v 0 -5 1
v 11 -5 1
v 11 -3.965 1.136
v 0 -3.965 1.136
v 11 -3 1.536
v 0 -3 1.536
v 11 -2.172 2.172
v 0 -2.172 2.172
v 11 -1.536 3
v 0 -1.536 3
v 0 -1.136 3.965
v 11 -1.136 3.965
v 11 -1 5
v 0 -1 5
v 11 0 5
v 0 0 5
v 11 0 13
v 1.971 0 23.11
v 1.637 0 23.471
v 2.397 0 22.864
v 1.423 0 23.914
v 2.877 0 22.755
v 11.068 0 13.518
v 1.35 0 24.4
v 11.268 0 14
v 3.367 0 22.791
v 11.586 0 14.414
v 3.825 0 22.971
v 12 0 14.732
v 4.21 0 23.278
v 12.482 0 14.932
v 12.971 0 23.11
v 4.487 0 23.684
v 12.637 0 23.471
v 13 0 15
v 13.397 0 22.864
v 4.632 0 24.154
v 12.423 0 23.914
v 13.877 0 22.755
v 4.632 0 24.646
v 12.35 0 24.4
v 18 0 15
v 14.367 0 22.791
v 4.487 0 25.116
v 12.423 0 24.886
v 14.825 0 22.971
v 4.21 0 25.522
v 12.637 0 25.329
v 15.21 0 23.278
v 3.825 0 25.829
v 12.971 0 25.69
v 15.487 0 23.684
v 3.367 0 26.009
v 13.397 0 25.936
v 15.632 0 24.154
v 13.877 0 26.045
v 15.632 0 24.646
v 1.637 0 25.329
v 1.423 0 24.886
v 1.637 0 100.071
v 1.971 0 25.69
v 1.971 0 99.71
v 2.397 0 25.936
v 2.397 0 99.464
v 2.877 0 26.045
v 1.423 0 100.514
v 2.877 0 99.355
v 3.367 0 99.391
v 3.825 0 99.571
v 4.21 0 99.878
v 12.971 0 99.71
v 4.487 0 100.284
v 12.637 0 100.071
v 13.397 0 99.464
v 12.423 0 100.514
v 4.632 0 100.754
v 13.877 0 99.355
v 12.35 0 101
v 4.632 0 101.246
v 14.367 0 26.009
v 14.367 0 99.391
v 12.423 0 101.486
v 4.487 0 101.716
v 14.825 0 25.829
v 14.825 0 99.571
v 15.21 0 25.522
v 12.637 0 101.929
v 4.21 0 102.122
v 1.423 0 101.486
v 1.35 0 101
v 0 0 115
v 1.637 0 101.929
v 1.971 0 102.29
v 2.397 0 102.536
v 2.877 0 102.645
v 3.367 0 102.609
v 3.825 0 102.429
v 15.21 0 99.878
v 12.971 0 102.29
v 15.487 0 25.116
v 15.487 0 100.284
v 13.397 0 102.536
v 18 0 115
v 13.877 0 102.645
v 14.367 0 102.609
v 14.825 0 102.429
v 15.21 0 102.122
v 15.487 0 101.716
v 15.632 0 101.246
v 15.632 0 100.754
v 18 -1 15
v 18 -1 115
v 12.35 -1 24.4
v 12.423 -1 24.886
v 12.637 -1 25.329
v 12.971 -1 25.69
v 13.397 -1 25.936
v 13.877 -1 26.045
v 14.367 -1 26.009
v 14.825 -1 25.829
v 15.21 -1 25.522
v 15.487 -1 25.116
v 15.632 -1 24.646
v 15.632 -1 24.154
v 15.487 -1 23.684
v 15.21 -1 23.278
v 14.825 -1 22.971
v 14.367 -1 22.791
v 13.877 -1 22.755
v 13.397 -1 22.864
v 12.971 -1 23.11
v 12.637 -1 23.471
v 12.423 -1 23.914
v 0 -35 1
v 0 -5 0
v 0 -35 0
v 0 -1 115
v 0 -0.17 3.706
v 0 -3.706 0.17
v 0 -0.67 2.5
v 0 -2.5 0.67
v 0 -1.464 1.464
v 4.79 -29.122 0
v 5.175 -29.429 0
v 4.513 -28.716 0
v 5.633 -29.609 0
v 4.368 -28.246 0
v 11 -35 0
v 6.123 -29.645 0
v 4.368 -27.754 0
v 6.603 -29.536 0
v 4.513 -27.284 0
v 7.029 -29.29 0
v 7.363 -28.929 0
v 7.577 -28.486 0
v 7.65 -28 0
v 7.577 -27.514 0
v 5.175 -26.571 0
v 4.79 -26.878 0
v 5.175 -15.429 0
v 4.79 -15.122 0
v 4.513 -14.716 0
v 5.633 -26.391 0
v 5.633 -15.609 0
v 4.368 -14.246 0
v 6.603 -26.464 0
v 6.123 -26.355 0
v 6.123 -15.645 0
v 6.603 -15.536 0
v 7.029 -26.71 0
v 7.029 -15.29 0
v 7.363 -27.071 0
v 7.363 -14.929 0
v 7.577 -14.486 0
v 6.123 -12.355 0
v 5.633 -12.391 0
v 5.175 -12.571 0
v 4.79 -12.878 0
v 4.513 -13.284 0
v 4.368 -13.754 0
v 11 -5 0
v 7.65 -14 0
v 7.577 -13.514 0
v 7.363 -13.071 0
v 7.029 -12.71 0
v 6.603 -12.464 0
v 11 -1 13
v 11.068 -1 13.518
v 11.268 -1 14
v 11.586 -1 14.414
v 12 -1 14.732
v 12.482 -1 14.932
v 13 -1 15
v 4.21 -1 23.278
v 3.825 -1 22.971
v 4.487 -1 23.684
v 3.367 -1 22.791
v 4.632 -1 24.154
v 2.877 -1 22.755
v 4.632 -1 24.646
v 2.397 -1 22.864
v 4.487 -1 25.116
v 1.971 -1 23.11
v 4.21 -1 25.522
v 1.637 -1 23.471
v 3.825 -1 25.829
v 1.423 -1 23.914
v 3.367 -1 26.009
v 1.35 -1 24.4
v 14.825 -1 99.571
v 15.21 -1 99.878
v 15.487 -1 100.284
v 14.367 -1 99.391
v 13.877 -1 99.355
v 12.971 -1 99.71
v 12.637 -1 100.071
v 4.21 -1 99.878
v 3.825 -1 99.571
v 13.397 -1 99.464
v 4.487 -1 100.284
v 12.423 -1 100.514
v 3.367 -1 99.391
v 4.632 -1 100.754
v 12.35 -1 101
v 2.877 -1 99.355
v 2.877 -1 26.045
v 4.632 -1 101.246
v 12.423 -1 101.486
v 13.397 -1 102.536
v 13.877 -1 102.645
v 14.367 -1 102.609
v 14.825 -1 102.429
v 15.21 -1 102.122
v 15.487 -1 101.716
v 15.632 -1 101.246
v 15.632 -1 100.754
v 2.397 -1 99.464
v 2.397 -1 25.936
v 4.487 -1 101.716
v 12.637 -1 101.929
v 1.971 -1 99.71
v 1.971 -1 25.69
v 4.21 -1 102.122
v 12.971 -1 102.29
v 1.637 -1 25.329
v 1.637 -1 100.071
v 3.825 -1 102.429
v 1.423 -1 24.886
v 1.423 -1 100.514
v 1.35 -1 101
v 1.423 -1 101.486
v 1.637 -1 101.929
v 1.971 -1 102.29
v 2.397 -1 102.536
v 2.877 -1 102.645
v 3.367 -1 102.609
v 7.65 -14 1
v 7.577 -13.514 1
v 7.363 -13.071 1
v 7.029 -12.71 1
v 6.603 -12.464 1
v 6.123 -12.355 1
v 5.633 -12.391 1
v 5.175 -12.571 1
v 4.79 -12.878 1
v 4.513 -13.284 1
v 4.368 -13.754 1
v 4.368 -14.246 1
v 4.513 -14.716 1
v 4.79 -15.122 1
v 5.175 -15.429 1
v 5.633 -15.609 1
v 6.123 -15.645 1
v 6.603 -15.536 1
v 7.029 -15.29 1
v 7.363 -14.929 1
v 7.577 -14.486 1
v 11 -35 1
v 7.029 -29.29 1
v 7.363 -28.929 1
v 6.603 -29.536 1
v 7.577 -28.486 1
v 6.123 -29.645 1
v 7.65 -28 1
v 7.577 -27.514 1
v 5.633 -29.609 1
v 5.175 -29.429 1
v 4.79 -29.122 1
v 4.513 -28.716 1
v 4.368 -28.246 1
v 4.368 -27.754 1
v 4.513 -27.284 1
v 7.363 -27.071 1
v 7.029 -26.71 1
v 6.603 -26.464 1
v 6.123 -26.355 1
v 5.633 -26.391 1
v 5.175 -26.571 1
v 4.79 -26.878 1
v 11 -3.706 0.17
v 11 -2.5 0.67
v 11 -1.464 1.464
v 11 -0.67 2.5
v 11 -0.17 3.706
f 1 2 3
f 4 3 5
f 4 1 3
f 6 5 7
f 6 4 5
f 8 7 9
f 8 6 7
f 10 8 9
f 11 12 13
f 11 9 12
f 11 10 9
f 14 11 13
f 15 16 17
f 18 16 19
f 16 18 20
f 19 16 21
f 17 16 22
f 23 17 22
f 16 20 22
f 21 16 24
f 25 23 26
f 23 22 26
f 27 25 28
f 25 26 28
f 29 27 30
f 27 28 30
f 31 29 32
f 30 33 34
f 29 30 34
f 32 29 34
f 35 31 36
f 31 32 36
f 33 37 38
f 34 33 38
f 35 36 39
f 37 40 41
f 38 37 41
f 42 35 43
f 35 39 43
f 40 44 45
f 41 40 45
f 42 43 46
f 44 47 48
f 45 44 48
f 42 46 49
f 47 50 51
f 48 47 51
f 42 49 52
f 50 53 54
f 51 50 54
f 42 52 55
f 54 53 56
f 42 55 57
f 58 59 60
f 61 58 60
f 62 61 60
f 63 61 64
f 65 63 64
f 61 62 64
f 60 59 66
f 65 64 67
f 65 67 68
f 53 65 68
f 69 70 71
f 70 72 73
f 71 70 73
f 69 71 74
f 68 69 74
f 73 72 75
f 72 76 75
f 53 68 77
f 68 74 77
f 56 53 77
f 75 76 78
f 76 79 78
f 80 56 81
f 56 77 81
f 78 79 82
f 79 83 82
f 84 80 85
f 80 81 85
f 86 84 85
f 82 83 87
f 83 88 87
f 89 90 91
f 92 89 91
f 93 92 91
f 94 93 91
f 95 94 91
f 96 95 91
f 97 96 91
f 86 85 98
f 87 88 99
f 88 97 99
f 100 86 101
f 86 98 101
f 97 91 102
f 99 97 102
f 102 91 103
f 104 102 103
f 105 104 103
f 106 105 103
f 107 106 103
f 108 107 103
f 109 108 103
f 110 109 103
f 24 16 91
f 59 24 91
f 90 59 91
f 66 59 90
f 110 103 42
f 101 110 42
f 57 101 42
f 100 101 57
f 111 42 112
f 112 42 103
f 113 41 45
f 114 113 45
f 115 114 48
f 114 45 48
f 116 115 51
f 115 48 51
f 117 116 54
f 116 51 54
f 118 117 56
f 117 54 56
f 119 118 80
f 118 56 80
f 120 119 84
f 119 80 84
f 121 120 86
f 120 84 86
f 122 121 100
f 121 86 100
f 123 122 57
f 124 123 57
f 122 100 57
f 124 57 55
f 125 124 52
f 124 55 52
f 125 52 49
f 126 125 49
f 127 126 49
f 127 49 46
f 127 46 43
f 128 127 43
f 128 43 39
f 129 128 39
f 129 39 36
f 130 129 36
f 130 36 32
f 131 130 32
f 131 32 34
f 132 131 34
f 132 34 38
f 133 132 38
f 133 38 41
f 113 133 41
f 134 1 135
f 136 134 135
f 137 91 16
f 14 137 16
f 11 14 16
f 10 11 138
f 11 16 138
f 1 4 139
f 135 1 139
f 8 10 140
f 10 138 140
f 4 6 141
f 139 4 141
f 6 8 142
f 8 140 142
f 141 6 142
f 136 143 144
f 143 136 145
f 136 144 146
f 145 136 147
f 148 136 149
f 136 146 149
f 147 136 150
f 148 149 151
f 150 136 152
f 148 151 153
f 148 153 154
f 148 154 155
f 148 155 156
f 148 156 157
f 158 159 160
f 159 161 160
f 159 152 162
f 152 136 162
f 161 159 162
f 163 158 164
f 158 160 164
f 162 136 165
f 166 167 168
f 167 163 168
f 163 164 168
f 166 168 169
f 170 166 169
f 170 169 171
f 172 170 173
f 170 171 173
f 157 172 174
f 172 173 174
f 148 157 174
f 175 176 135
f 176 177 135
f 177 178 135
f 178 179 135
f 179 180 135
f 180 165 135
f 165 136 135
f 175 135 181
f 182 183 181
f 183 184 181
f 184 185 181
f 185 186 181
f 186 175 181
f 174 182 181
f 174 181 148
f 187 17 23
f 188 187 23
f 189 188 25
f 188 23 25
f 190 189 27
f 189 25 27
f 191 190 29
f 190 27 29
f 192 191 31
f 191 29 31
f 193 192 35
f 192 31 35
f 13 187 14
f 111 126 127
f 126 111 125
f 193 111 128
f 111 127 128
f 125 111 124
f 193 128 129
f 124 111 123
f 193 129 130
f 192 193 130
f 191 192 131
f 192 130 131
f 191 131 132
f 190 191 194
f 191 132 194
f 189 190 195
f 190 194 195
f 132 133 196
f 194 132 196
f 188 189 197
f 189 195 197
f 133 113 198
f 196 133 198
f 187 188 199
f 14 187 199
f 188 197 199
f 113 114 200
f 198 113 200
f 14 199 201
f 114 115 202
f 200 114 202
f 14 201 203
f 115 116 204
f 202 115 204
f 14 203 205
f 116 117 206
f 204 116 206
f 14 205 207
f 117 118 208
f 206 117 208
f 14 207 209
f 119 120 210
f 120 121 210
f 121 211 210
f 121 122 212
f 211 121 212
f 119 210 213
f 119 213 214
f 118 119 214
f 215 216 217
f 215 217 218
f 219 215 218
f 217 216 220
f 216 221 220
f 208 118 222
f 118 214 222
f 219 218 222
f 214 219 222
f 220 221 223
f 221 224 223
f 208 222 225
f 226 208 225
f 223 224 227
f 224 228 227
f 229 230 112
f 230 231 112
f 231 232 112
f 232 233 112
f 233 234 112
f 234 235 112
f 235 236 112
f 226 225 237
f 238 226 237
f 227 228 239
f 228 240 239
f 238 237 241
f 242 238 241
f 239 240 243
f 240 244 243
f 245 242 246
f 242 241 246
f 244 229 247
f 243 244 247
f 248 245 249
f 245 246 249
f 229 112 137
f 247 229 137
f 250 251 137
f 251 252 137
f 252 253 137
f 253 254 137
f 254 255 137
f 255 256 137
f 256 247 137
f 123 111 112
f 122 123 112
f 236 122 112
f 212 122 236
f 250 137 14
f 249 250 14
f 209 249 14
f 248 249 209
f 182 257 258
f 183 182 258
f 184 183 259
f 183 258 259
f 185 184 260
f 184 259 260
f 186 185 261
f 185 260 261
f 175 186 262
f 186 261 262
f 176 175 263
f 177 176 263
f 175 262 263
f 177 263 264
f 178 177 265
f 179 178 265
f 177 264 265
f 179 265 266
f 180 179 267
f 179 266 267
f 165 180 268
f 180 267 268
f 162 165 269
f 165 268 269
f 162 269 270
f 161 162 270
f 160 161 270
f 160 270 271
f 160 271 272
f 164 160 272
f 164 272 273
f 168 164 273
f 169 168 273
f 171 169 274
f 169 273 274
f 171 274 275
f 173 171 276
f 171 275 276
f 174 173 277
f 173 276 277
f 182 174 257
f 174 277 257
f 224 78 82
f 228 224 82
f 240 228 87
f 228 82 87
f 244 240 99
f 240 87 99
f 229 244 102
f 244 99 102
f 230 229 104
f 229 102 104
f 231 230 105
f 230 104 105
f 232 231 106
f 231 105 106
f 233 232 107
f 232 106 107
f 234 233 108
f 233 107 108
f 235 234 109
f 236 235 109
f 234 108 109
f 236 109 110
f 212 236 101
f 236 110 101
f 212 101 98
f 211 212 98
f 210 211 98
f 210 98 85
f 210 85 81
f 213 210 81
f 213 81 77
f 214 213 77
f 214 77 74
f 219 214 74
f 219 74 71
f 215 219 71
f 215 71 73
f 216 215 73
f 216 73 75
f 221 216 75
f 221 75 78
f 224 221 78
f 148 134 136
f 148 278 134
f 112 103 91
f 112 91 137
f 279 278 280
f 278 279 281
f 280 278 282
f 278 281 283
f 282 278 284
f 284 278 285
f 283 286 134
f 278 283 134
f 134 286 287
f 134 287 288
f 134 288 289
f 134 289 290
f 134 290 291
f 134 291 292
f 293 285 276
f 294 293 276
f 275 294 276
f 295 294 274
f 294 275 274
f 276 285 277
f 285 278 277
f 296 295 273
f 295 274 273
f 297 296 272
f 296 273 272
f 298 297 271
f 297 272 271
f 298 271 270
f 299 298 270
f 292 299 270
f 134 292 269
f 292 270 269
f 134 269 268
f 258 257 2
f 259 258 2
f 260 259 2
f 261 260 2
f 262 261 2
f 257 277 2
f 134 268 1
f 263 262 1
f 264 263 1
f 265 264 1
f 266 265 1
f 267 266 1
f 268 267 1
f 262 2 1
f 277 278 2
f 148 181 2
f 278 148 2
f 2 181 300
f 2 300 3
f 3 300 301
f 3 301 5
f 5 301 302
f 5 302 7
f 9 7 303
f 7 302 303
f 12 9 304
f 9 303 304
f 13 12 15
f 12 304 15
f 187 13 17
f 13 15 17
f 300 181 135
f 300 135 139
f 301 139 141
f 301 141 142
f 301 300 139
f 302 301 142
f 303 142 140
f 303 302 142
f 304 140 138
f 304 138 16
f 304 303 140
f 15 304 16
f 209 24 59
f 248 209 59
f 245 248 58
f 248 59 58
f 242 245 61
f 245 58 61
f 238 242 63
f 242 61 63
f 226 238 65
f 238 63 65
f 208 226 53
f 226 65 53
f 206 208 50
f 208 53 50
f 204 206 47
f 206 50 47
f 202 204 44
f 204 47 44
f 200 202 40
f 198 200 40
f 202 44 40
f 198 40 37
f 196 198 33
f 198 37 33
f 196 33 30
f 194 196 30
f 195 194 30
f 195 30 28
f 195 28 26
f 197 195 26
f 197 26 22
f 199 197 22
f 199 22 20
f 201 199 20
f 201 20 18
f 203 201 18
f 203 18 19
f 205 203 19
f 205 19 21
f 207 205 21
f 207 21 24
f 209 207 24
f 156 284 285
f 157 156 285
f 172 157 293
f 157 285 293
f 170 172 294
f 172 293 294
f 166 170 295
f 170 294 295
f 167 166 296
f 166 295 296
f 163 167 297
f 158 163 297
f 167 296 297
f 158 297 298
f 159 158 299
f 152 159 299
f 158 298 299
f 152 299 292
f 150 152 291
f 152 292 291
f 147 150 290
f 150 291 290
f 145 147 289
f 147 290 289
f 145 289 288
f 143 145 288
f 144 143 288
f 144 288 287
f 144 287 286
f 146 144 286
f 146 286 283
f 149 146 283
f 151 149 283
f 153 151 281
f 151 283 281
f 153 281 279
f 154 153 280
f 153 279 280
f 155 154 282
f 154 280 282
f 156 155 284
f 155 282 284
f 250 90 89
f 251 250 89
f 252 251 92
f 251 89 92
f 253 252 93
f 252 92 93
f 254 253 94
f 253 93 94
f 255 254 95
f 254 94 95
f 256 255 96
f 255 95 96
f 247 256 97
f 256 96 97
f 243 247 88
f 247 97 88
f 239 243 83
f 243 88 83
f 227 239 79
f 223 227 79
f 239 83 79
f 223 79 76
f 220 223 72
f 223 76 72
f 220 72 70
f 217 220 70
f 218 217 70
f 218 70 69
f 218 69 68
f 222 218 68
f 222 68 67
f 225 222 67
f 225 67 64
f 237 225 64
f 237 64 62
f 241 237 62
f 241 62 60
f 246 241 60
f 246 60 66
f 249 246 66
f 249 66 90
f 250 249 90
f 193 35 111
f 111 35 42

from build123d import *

# Parameters (mm, degrees)
F2_W     = 18
F2_H     = 1
F4_R     = 1.65
F5_DEPTH = 1
F6_R     = 1.65
F7_DEPTH = 35.001


with BuildPart() as f3:
    # F3: sweep along a path in F0
    with BuildLine(Plane.YZ) as f3_path:
        Line((-35, 0), (-5, 0))
        ThreePointArc((-5, 0), (-1.4644660941, 1.4644660941), (0, 5))
        Line((0, 5), (0, 115))
    # F2 (on plane+point) → F3 (sweep)
    with BuildSketch(Plane.XZ.offset(35)):
        with Locations((9, 0.5)):
            Rectangle(F2_W, F2_H)
    sweep(path=f3_path.line)

    # F4 (on face) → F5 (cut, through all)
    with BuildSketch(Plane.XY.offset(1)):
        with Locations((6, -14)):
            Circle(F4_R)
        with Locations((6, -28)):
            Circle(F4_R)
    extrude(amount=-F5_DEPTH, mode=Mode.SUBTRACT)

    # F6 (on face) → F7 (cut, through all)
    with BuildSketch(Plane(origin=(0, 0, 0), x_dir=(-1, 0, 0), z_dir=(0, 1, 0))):
        with Locations((-3, 24.4)):
            Circle(F6_R)
        with Locations((-14, 24.4)):
            Circle(F6_R)
        with Locations((-14, 101)):
            Circle(F6_R)
        with Locations((-3, 101)):
            Circle(F6_R)
        with BuildLine():
            Line((-18, 15), (-18, 0))
            Line((-18, 0), (-11, 0))
            Line((-11, 0), (-11, 13))
            ThreePointArc((-11, 13), (-11.5857864376, 14.4142135624), (-13, 15))
            Line((-13, 15), (-18, 15))
        make_face()
    extrude(amount=-F7_DEPTH, mode=Mode.SUBTRACT)


solid = f3.part
